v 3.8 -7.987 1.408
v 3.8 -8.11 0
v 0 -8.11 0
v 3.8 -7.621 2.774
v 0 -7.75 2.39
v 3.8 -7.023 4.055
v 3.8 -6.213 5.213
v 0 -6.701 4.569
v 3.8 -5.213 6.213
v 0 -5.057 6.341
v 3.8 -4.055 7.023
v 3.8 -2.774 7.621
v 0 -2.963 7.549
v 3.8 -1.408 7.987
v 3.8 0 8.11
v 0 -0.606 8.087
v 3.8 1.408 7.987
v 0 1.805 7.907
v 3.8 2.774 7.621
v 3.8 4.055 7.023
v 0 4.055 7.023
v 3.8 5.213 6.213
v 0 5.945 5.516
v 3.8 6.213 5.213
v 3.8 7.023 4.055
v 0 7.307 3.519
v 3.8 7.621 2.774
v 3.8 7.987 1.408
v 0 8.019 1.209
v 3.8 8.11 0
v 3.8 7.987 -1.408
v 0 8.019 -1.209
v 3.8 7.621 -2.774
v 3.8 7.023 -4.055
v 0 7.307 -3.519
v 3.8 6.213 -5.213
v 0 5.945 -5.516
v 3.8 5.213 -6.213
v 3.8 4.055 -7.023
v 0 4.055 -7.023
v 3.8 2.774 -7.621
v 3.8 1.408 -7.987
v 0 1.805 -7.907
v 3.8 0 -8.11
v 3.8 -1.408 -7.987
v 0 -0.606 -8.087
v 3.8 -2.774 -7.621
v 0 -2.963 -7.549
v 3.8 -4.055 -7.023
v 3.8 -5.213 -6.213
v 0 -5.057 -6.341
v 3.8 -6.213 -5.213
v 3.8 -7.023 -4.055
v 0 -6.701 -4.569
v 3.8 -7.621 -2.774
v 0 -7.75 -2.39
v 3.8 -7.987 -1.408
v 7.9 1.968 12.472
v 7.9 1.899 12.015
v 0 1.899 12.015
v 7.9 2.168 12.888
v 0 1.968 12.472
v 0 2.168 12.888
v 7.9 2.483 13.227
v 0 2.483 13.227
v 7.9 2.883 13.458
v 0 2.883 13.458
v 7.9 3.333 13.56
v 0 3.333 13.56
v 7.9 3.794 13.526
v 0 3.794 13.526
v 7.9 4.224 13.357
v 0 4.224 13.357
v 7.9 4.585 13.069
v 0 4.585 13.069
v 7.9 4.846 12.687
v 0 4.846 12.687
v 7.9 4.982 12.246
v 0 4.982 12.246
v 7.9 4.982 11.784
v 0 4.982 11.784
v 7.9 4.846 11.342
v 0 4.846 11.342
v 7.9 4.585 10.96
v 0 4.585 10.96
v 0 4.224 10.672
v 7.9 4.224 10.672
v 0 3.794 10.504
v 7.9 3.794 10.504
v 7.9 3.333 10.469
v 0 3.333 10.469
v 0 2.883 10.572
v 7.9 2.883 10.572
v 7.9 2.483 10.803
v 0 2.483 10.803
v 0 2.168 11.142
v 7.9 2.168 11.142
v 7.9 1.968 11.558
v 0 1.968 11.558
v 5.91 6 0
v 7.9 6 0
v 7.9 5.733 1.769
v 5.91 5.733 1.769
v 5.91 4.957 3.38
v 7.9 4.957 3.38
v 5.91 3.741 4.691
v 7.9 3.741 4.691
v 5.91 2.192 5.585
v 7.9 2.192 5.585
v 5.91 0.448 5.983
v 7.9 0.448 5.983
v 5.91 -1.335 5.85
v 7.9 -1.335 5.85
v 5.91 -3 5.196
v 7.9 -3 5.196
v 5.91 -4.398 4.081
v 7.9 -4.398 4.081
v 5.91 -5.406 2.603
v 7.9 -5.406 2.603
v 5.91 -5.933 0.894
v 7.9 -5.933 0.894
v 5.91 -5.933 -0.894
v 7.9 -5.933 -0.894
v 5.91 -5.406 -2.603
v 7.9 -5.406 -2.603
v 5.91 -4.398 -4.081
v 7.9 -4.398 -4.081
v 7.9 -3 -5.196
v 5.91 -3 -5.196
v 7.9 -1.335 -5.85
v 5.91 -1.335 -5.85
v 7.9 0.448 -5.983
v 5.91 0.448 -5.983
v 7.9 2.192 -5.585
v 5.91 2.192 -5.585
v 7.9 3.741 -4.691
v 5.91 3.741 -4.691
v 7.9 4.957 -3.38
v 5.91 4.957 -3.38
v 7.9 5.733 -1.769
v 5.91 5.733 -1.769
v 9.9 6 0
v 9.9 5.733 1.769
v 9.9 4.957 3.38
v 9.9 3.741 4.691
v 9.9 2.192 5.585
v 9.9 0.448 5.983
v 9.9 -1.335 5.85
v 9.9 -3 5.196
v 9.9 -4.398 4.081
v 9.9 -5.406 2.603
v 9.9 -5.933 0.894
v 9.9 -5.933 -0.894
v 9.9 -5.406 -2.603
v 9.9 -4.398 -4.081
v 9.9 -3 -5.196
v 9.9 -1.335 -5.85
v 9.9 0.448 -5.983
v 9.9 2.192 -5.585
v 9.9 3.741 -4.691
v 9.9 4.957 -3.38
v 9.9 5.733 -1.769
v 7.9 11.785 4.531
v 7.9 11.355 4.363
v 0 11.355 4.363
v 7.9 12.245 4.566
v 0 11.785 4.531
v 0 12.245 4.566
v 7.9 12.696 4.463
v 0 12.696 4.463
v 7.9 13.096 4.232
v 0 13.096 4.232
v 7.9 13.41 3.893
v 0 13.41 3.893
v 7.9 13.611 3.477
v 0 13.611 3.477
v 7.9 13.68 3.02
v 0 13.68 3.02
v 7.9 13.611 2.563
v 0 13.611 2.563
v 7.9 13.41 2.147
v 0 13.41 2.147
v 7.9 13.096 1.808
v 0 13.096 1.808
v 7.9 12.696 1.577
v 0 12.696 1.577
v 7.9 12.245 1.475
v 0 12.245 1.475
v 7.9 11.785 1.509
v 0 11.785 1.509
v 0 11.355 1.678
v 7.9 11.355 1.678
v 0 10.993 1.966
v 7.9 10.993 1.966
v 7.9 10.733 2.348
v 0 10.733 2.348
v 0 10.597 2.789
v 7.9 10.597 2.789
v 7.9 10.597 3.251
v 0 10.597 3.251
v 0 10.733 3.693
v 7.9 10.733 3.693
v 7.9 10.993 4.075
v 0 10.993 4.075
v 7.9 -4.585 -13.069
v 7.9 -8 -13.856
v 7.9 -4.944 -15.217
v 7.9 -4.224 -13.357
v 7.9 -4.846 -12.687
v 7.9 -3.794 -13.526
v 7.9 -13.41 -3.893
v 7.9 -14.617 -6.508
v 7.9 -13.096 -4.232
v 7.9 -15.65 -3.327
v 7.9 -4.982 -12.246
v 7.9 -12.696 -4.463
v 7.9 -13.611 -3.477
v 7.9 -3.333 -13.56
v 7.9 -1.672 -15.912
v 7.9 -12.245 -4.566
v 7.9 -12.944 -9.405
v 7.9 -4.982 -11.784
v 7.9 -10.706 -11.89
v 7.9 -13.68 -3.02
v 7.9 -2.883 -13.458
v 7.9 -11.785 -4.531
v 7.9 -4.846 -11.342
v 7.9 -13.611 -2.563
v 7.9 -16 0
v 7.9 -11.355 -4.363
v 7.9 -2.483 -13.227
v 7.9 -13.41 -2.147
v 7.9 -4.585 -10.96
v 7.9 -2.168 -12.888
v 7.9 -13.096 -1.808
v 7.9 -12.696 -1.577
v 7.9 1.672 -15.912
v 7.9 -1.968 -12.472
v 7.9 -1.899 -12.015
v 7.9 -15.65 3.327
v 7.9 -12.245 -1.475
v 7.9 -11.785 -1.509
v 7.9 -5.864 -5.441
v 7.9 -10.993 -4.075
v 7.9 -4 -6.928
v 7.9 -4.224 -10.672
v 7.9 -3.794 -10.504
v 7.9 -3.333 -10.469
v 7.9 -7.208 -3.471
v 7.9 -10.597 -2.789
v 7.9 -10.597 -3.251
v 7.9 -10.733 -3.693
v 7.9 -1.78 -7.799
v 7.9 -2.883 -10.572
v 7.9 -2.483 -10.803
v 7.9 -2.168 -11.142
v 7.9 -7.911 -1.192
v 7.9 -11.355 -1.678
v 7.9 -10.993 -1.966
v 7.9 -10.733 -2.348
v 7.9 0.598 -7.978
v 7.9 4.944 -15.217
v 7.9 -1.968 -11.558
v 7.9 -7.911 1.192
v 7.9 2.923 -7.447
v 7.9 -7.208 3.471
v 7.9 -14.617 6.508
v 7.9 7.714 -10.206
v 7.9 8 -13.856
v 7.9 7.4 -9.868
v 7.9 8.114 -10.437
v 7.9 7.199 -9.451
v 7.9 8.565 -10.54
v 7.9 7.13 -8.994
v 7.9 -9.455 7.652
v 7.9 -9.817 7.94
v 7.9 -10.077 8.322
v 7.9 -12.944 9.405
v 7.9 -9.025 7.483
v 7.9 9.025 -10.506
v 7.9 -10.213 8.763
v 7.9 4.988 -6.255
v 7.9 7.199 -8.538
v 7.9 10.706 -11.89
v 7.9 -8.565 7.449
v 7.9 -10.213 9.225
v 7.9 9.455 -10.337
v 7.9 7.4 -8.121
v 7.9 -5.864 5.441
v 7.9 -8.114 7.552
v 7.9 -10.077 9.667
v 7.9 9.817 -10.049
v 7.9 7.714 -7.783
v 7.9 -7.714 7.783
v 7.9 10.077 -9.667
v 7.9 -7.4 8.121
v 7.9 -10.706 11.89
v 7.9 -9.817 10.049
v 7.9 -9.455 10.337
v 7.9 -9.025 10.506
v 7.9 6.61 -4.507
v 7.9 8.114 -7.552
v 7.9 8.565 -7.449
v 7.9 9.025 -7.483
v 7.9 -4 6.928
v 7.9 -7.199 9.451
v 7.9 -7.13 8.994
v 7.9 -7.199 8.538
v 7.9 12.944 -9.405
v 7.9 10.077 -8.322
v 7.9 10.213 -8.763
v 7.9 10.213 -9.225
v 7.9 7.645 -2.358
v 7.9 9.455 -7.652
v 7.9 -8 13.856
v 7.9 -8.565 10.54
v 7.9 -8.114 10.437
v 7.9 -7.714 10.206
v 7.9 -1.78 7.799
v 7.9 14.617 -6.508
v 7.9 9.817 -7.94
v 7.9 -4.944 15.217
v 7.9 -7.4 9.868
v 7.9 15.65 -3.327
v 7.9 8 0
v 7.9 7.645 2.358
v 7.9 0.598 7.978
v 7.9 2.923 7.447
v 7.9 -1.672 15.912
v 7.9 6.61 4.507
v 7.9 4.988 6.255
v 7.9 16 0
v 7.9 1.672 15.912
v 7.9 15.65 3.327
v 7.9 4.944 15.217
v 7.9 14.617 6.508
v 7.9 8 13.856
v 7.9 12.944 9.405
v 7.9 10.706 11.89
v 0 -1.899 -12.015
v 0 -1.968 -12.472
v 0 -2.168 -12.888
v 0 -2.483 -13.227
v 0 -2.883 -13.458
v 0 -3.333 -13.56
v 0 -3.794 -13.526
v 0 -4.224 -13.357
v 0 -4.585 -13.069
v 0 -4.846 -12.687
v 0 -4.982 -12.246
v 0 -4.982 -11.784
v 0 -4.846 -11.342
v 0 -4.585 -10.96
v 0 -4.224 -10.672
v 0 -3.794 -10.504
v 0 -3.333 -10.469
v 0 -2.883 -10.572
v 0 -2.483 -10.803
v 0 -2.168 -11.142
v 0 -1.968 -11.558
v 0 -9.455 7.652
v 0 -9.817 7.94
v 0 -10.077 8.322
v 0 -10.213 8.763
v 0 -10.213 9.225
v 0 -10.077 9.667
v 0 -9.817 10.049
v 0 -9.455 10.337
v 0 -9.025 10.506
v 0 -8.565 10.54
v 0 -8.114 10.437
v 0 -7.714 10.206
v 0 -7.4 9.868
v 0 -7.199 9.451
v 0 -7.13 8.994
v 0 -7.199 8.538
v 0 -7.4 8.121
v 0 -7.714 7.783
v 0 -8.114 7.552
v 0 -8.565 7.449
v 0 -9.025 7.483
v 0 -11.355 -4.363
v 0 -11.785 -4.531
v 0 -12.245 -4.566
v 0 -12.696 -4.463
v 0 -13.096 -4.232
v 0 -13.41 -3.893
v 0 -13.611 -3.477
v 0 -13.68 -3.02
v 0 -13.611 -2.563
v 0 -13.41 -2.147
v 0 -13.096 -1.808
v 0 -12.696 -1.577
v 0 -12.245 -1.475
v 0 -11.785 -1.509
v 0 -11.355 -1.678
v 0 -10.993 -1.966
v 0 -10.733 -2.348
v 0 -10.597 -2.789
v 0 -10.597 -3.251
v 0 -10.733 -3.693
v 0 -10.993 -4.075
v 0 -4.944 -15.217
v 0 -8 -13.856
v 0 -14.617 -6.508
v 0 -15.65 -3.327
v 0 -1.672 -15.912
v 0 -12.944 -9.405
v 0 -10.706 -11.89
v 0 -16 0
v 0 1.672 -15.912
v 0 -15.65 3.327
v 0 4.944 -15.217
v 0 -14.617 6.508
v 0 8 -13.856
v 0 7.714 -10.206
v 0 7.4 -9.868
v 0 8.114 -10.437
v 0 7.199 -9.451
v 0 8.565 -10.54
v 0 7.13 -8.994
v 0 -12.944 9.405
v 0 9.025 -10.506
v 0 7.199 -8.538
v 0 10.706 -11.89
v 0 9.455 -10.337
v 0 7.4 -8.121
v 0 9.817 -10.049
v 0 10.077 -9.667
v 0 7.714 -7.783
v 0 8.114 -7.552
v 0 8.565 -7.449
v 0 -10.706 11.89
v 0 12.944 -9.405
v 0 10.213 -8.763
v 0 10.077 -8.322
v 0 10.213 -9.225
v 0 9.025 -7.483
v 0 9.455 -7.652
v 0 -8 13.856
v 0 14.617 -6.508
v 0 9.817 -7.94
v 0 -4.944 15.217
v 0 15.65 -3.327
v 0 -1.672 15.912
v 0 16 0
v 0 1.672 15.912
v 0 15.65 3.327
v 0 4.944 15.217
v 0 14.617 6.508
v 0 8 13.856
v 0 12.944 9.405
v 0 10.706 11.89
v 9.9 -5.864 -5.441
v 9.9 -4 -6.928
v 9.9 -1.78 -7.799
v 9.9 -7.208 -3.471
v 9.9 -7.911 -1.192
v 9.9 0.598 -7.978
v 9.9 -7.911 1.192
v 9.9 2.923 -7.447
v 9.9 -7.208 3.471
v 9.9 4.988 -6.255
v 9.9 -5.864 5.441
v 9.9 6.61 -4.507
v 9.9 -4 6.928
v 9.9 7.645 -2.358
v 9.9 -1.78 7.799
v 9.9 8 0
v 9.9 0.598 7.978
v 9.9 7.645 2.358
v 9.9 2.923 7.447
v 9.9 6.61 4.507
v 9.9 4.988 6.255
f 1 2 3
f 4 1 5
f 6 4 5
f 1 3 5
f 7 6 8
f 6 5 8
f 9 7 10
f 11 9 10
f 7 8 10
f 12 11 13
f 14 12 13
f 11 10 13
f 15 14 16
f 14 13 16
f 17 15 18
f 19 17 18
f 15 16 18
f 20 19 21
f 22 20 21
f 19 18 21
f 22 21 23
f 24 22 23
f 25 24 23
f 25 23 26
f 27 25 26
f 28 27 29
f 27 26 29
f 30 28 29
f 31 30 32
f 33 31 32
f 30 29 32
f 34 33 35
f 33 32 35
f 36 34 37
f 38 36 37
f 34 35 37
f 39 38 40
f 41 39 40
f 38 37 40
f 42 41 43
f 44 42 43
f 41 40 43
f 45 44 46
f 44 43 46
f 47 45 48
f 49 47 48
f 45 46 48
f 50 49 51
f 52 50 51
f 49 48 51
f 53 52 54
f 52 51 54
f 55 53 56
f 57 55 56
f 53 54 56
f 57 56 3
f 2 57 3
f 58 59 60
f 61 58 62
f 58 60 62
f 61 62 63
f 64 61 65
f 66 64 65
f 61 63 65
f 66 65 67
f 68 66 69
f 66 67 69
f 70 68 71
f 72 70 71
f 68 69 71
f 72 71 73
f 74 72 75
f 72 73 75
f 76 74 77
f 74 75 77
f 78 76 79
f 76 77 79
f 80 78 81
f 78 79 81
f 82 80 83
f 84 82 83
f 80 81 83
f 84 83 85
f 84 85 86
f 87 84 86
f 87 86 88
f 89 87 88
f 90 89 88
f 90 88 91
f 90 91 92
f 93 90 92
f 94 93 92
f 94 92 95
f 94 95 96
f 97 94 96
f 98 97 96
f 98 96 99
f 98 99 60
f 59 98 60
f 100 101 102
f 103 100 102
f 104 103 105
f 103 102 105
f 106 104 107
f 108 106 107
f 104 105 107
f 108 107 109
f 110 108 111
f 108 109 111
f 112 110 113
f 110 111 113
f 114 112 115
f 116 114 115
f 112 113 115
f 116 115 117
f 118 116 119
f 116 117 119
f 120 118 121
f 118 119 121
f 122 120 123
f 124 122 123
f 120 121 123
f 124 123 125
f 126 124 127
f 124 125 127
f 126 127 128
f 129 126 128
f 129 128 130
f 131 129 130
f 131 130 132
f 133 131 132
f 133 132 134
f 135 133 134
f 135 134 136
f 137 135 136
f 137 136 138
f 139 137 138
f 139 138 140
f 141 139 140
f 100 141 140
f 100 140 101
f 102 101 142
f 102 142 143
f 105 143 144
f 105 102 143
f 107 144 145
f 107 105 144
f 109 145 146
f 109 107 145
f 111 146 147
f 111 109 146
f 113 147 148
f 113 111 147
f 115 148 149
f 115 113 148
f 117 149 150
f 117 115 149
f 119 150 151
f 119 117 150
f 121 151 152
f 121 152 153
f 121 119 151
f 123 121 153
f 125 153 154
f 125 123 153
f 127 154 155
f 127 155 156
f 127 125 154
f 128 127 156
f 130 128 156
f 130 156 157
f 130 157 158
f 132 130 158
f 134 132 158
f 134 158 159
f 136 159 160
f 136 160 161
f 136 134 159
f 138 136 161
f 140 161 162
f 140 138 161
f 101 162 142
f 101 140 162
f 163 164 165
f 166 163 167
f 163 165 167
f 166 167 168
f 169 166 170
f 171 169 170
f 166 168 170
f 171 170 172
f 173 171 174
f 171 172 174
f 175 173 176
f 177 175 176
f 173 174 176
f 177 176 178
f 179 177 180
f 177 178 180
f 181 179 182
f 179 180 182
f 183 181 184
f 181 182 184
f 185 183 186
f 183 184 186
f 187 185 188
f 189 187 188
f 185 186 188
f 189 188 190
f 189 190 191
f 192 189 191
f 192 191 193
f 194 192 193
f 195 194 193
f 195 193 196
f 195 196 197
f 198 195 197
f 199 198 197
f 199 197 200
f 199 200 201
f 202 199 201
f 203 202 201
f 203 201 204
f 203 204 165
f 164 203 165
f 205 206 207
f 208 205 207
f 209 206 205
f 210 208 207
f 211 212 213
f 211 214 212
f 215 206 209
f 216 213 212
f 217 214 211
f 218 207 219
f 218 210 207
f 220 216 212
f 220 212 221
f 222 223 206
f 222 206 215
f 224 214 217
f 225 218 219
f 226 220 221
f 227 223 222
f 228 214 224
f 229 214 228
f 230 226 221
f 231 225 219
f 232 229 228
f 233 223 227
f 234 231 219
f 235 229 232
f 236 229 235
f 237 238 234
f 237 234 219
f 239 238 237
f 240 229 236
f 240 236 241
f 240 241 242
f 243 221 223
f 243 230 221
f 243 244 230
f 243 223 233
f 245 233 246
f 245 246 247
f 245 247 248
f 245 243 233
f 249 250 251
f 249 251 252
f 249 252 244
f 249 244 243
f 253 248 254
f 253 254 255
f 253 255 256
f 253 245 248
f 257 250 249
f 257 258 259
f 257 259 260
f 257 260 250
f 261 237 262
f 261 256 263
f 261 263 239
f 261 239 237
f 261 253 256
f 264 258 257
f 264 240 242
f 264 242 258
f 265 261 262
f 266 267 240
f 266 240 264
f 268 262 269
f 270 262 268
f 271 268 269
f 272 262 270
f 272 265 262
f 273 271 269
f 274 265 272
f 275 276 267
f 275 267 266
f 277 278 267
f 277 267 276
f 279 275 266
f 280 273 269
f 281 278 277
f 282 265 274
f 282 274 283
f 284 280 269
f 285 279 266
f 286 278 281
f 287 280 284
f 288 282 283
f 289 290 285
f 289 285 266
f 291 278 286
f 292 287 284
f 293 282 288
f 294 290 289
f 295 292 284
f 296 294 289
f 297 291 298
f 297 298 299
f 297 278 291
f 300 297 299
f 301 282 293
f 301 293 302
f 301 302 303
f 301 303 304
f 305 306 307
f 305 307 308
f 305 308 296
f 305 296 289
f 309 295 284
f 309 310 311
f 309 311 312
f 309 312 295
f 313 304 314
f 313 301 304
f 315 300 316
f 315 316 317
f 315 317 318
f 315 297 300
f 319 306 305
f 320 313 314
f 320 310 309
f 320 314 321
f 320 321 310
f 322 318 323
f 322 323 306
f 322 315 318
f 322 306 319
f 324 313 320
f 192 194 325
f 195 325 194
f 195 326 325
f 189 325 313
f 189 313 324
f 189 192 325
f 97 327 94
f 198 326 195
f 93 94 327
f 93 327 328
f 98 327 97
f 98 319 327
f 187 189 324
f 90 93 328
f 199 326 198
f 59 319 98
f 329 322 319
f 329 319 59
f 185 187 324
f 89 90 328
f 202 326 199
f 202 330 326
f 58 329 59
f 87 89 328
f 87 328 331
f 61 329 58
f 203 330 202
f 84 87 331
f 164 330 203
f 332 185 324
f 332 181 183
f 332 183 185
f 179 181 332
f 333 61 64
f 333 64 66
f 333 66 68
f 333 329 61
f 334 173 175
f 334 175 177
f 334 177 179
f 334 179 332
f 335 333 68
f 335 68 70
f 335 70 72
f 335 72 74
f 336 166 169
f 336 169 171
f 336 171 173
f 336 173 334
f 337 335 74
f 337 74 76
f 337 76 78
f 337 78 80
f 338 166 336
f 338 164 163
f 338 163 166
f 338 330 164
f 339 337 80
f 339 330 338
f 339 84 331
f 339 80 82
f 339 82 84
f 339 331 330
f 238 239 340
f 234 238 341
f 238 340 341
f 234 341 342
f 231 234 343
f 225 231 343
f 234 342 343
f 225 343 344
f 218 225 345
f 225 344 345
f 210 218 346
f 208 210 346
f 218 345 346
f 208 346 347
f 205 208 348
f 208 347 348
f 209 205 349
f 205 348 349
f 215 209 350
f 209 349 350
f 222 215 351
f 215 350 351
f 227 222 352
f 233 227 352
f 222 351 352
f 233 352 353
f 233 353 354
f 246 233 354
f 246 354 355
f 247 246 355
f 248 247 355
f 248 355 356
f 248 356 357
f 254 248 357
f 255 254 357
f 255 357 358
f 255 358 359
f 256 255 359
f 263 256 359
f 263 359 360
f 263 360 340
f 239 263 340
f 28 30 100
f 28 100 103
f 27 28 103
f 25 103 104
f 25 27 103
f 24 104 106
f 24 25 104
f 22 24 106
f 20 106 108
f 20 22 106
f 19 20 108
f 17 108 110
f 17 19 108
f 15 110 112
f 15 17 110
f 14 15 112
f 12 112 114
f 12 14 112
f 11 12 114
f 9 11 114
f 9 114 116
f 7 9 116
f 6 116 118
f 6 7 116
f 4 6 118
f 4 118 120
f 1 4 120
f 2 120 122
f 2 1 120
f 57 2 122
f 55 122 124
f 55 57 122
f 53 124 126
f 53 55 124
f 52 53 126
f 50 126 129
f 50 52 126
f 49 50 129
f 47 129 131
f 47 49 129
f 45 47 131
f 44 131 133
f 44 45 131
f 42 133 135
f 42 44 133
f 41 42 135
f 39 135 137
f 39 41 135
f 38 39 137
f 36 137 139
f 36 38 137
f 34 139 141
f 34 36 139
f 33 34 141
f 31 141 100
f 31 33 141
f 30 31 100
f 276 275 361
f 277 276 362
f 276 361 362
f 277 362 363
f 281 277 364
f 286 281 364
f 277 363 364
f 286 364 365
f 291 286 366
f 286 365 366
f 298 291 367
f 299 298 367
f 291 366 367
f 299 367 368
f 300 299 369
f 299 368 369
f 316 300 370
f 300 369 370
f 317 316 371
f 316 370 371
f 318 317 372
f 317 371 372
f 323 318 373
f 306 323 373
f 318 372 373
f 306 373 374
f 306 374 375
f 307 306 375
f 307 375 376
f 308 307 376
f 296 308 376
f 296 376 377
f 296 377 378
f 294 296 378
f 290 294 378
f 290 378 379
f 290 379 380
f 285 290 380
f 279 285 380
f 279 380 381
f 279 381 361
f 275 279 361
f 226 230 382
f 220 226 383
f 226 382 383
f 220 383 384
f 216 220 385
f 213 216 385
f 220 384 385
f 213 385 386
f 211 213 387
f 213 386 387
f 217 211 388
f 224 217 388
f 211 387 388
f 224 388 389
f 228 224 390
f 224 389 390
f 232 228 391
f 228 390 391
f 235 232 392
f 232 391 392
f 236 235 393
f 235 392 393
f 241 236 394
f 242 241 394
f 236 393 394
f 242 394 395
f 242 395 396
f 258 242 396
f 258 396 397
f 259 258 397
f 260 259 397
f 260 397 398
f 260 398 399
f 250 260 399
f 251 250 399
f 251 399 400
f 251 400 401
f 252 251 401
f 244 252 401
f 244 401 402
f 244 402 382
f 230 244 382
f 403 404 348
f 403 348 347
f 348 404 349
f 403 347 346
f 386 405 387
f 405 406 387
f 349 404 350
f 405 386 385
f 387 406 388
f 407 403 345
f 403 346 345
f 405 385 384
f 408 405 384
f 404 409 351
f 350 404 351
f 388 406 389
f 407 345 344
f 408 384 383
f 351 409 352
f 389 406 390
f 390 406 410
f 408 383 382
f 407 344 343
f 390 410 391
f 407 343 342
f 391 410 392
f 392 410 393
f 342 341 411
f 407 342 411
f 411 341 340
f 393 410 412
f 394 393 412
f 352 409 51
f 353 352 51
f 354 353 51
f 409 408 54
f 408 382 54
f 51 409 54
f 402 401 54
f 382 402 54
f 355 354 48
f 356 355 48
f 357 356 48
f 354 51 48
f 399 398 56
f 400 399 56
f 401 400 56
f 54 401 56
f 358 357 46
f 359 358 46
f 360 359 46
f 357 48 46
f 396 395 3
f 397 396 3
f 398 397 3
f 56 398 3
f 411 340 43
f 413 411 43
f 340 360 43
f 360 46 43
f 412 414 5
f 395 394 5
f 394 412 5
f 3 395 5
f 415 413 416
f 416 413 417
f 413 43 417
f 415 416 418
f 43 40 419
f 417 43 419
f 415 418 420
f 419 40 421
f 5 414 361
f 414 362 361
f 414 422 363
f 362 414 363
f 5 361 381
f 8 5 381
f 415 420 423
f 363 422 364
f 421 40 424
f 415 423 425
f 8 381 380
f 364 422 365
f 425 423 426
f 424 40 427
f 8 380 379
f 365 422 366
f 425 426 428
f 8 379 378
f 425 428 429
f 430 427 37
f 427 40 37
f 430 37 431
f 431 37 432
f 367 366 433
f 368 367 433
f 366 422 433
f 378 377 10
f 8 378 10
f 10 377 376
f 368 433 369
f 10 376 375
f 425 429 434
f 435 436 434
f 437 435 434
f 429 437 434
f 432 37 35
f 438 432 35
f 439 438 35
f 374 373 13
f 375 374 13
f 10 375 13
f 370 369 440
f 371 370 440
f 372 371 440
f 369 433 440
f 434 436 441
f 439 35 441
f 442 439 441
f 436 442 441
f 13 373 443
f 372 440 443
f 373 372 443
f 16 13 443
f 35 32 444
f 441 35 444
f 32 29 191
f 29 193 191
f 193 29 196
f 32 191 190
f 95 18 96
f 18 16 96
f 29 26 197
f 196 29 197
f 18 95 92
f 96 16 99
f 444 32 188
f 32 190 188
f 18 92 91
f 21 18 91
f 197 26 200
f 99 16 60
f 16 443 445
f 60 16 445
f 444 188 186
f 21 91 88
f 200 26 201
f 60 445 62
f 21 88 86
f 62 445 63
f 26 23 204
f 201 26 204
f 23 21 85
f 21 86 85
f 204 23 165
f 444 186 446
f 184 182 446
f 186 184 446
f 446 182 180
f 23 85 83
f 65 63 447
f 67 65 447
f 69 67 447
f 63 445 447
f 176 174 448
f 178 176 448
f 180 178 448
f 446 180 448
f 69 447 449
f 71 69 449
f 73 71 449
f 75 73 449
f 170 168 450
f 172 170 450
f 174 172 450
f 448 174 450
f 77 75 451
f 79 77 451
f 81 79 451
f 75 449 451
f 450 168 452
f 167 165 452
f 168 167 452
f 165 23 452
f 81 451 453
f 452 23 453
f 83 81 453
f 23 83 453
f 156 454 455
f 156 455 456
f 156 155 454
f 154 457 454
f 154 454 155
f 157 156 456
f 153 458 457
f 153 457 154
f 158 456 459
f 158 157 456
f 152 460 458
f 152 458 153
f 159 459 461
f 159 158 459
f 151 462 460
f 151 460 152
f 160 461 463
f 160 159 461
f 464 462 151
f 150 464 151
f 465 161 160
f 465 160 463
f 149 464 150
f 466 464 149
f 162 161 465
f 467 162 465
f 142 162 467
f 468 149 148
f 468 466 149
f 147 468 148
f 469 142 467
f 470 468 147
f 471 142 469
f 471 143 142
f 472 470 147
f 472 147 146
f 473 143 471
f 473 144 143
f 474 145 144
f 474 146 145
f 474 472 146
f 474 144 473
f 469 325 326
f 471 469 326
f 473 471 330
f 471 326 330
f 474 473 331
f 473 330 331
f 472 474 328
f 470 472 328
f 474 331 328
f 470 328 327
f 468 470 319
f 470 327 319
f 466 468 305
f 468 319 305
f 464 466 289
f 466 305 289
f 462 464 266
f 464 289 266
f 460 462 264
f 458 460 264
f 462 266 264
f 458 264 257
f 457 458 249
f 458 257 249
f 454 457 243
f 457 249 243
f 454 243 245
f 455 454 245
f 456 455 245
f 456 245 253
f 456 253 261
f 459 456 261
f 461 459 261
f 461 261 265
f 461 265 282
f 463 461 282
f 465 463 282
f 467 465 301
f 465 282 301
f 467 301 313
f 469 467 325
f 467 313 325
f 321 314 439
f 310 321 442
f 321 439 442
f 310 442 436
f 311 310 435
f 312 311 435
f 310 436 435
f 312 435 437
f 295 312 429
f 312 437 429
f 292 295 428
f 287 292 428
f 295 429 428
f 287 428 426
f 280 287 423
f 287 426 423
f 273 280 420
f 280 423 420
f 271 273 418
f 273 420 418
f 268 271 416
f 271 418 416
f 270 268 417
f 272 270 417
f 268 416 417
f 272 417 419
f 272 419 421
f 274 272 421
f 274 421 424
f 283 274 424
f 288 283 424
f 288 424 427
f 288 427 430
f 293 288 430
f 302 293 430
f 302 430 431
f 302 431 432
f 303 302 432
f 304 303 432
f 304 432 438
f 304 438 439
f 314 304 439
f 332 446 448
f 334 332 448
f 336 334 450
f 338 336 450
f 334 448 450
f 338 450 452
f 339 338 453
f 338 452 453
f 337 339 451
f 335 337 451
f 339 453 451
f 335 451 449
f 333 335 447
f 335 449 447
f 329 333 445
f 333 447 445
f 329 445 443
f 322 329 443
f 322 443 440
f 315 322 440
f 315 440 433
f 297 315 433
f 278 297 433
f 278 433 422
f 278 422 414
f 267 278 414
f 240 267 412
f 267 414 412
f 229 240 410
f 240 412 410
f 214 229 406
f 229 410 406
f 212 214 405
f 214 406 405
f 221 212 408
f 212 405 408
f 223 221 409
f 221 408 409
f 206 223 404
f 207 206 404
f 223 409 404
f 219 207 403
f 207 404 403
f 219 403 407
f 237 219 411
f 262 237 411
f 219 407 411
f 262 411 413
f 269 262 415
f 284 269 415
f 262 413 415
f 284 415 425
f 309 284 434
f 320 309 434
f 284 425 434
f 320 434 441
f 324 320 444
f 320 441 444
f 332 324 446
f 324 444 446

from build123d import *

# Parameters (mm, degrees)
F0_R            = 16
F1_DEPTH        = 7.9
F2_R            = 8.11
F3_DEPTH        = 3.8
F4_R            = 6
F5_DEPTH        = 7.901
F6_R            = 1.55
F7_DEPTH        = 7.901
F7_COPIES_COUNT = 6
F8_R            = 8
F8_R_2          = 6
F9_DEPTH        = 2
F10_SIZE2       = 2.10999
F10_SIZE        = 2.10999


# Not quite as in the source:
# - a fillet or chamfer is up to 0.001 mm smaller than in the source, because OpenCascade refuses the exact size
# - a pattern or mirror of a feature is missing from the dataset's text; its kind, count and spacing are read off the source's solid


with BuildPart() as f1:
    # F0 (on Right) → F1 (new body)
    with BuildSketch(Plane.YZ):
        Circle(F0_R)
    extrude(amount=F1_DEPTH)

    # F2 (on face) → F3 (cut)
    with BuildSketch(Plane(origin=(0, 0, 0), x_dir=(0, -1, 0), z_dir=(-1, 0, 0))):
        Circle(F2_R)
    extrude(amount=-F3_DEPTH, mode=Mode.SUBTRACT)

    # F4 (on face) → F5 (cut, through all)
    with BuildSketch(Plane.YZ.offset(7.9)):
        Circle(F4_R)
    extrude(amount=-F5_DEPTH, mode=Mode.SUBTRACT)

    # F6 (on face) → F7 (cut, through all)
    with BuildSketch(Plane(origin=(0, 0, 0), x_dir=(0, -1, 0), z_dir=(-1, 0, 0))):
        with Locations((-3.4491492906, 12.0147146937)):
            Circle(F6_R)
    f7 = extrude(amount=-F7_DEPTH, mode=Mode.SUBTRACT)

    # F7_copies: F7 ×6 about axis
    f7_copies_axis = Axis((0, 0, 0), (1, 0, 0))
    for i in range(1, F7_COPIES_COUNT):
        add(f7.rotate(f7_copies_axis, i * 360 / F7_COPIES_COUNT), mode=Mode.SUBTRACT)

    # F8 (on face) → F9 (join)
    with BuildSketch(Plane.YZ.offset(7.9)):
        Circle(F8_R)
        Circle(F8_R_2, mode=Mode.SUBTRACT)
    extrude(amount=F9_DEPTH)

    # F10 (size 2.11 and 2.11 in the source; OpenCascade refuses exactly that, so slightly less here)
    f10_edges = [f1.edges().sort_by_distance(p)[0] for p in [
        (3.8, -6, 0),
    ]]
    chamfer(f10_edges, length=F10_SIZE, length2=F10_SIZE2)


solid = f1.part
